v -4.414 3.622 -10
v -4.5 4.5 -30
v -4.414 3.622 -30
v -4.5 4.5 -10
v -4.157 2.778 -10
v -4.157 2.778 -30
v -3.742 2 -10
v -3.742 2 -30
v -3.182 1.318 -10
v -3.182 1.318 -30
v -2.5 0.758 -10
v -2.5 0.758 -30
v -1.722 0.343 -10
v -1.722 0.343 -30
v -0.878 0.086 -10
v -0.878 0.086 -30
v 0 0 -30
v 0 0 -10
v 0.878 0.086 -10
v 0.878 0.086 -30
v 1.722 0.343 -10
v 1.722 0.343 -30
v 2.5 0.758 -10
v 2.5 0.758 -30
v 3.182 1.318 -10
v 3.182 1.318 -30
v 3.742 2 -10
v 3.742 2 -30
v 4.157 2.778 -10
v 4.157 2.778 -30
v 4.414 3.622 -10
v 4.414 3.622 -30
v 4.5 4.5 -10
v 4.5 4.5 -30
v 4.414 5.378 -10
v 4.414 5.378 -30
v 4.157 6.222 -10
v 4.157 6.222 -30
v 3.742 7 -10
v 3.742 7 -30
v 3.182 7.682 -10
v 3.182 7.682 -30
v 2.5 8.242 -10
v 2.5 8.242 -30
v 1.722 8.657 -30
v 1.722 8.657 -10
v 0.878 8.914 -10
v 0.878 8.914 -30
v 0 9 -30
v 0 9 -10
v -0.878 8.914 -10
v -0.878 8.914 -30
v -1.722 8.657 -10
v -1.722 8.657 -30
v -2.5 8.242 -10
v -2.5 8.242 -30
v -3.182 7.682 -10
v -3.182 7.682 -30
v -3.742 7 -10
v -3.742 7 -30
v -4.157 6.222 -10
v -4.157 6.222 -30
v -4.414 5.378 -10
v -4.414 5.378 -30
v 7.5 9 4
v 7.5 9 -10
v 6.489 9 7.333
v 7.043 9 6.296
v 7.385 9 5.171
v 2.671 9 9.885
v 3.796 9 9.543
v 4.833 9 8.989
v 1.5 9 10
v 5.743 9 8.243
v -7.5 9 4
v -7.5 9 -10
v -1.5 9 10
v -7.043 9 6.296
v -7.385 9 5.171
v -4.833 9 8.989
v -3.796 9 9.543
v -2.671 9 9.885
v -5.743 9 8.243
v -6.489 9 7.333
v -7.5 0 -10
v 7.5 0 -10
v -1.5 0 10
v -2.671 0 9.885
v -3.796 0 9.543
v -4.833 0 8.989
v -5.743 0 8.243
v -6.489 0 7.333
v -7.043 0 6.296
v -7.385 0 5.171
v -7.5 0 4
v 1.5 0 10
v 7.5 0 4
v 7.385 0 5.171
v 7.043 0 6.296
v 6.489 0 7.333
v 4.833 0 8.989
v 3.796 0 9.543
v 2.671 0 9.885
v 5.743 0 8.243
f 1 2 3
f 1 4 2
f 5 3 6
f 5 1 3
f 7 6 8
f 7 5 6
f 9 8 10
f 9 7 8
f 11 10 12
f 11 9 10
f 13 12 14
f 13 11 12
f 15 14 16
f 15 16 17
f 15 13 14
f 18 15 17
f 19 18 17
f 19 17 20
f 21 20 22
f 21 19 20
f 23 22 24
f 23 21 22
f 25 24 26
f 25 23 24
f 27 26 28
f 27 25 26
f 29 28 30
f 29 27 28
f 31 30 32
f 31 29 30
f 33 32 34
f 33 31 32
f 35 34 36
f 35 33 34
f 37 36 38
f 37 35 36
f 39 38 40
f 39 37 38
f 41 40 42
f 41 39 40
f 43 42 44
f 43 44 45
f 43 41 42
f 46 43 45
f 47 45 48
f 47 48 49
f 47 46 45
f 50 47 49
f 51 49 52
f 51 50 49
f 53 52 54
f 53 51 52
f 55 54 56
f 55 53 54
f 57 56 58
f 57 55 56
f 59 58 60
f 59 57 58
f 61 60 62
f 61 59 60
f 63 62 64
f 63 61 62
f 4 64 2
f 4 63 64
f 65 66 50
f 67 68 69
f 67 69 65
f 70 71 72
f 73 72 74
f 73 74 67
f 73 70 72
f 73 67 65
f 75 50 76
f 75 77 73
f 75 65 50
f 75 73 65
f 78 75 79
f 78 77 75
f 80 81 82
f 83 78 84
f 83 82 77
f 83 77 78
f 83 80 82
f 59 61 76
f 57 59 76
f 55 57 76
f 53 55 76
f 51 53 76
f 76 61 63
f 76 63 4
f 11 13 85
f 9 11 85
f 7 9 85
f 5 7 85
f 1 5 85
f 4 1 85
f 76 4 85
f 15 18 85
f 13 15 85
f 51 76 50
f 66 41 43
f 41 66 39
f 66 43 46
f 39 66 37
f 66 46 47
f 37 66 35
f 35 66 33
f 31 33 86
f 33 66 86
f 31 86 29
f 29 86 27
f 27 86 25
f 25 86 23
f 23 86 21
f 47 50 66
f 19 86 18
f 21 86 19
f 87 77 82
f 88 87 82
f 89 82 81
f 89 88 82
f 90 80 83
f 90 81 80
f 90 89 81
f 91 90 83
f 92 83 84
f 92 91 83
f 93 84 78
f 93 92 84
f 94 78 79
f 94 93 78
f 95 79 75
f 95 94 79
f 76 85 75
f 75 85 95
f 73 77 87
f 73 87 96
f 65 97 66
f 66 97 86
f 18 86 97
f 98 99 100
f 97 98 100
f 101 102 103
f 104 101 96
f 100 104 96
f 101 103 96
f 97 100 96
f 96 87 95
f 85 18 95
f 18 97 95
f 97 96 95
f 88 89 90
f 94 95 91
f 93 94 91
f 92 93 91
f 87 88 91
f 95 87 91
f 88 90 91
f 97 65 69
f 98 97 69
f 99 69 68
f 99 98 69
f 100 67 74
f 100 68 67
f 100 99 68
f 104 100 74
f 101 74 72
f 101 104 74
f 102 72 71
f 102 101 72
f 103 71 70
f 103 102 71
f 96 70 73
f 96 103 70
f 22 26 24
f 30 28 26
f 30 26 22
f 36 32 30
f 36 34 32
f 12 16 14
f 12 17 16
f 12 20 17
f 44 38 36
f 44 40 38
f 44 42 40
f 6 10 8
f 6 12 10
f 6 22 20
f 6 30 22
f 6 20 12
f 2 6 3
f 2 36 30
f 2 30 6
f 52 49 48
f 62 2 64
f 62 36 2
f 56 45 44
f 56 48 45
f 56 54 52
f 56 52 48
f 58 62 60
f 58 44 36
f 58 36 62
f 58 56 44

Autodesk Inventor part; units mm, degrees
ref_plane "YZ Plane" through (0, 0, 0) normal (1, 0, 0) x (0, 1, 0)
ref_plane "XZ Plane" through (0, 0, 0) normal (0, 1, 0) x (-1, 0, 0)
ref_plane "XY Plane" through (0, 0, 0) normal (0, 0, 1) x (1, 0, 0)
sketch "Эскиз1" plane through (0, 0, 0) normal (0, 1, 0) x (-1, 0, 0)
  line L0 (-7.5, -10) -> (7.5, -10)
  line L1 (7.5, -10) -> (7.5, 4)
  line L2 (1.5, 10) -> (-1.5, 10)
  line L3 (-7.5, 4) -> (-7.5, -10)
  line L4 (-7.5, -10) -> (7.5, 10) construction
  line L5 (7.5, -10) -> (-7.5, 10) construction
  arc A0 (7.5, 4) -> (1.5, 10) centre (1.5, 4) ccw
  arc A1 (-1.5, 10) -> (-7.5, 4) centre (-1.5, 4) ccw
  line L6 (0, -10) -> (5, -10)
  point P0 (0, 0)
  dimension "d0" = 15
  dimension "d1" = 20
  dimension "d2" = 6
  dimension "d3" = 6
extrude "Выдавливание1" add sketch "Эскиз1" along normal blind 9
sketch "Эскиз3" plane through (7.5, 0, -10) normal (0, 0, -1) x (-1, 0, 0)
  line L0 (0, 0) -> (0, 9) projected
  line L1 (15, 0) -> (9, 0) projected
  line L2 (0, 9) -> (15, 9)
  line L3 (15, 9) -> (15, 0)
  line L4 (15, 0) -> (0, 0)
  line L5 (0, 0) -> (0, 9)
  circle A0 centre (7.5, 4.5) radius 4.5
  point P0 (7.5, 0)
  dimension "d11" = 9
  dimension "d12" = 4.5
extrude "Выдавливание3" add sketch "Эскиз3" along normal blind 20 contours A0
properties part number "moroshenka"
